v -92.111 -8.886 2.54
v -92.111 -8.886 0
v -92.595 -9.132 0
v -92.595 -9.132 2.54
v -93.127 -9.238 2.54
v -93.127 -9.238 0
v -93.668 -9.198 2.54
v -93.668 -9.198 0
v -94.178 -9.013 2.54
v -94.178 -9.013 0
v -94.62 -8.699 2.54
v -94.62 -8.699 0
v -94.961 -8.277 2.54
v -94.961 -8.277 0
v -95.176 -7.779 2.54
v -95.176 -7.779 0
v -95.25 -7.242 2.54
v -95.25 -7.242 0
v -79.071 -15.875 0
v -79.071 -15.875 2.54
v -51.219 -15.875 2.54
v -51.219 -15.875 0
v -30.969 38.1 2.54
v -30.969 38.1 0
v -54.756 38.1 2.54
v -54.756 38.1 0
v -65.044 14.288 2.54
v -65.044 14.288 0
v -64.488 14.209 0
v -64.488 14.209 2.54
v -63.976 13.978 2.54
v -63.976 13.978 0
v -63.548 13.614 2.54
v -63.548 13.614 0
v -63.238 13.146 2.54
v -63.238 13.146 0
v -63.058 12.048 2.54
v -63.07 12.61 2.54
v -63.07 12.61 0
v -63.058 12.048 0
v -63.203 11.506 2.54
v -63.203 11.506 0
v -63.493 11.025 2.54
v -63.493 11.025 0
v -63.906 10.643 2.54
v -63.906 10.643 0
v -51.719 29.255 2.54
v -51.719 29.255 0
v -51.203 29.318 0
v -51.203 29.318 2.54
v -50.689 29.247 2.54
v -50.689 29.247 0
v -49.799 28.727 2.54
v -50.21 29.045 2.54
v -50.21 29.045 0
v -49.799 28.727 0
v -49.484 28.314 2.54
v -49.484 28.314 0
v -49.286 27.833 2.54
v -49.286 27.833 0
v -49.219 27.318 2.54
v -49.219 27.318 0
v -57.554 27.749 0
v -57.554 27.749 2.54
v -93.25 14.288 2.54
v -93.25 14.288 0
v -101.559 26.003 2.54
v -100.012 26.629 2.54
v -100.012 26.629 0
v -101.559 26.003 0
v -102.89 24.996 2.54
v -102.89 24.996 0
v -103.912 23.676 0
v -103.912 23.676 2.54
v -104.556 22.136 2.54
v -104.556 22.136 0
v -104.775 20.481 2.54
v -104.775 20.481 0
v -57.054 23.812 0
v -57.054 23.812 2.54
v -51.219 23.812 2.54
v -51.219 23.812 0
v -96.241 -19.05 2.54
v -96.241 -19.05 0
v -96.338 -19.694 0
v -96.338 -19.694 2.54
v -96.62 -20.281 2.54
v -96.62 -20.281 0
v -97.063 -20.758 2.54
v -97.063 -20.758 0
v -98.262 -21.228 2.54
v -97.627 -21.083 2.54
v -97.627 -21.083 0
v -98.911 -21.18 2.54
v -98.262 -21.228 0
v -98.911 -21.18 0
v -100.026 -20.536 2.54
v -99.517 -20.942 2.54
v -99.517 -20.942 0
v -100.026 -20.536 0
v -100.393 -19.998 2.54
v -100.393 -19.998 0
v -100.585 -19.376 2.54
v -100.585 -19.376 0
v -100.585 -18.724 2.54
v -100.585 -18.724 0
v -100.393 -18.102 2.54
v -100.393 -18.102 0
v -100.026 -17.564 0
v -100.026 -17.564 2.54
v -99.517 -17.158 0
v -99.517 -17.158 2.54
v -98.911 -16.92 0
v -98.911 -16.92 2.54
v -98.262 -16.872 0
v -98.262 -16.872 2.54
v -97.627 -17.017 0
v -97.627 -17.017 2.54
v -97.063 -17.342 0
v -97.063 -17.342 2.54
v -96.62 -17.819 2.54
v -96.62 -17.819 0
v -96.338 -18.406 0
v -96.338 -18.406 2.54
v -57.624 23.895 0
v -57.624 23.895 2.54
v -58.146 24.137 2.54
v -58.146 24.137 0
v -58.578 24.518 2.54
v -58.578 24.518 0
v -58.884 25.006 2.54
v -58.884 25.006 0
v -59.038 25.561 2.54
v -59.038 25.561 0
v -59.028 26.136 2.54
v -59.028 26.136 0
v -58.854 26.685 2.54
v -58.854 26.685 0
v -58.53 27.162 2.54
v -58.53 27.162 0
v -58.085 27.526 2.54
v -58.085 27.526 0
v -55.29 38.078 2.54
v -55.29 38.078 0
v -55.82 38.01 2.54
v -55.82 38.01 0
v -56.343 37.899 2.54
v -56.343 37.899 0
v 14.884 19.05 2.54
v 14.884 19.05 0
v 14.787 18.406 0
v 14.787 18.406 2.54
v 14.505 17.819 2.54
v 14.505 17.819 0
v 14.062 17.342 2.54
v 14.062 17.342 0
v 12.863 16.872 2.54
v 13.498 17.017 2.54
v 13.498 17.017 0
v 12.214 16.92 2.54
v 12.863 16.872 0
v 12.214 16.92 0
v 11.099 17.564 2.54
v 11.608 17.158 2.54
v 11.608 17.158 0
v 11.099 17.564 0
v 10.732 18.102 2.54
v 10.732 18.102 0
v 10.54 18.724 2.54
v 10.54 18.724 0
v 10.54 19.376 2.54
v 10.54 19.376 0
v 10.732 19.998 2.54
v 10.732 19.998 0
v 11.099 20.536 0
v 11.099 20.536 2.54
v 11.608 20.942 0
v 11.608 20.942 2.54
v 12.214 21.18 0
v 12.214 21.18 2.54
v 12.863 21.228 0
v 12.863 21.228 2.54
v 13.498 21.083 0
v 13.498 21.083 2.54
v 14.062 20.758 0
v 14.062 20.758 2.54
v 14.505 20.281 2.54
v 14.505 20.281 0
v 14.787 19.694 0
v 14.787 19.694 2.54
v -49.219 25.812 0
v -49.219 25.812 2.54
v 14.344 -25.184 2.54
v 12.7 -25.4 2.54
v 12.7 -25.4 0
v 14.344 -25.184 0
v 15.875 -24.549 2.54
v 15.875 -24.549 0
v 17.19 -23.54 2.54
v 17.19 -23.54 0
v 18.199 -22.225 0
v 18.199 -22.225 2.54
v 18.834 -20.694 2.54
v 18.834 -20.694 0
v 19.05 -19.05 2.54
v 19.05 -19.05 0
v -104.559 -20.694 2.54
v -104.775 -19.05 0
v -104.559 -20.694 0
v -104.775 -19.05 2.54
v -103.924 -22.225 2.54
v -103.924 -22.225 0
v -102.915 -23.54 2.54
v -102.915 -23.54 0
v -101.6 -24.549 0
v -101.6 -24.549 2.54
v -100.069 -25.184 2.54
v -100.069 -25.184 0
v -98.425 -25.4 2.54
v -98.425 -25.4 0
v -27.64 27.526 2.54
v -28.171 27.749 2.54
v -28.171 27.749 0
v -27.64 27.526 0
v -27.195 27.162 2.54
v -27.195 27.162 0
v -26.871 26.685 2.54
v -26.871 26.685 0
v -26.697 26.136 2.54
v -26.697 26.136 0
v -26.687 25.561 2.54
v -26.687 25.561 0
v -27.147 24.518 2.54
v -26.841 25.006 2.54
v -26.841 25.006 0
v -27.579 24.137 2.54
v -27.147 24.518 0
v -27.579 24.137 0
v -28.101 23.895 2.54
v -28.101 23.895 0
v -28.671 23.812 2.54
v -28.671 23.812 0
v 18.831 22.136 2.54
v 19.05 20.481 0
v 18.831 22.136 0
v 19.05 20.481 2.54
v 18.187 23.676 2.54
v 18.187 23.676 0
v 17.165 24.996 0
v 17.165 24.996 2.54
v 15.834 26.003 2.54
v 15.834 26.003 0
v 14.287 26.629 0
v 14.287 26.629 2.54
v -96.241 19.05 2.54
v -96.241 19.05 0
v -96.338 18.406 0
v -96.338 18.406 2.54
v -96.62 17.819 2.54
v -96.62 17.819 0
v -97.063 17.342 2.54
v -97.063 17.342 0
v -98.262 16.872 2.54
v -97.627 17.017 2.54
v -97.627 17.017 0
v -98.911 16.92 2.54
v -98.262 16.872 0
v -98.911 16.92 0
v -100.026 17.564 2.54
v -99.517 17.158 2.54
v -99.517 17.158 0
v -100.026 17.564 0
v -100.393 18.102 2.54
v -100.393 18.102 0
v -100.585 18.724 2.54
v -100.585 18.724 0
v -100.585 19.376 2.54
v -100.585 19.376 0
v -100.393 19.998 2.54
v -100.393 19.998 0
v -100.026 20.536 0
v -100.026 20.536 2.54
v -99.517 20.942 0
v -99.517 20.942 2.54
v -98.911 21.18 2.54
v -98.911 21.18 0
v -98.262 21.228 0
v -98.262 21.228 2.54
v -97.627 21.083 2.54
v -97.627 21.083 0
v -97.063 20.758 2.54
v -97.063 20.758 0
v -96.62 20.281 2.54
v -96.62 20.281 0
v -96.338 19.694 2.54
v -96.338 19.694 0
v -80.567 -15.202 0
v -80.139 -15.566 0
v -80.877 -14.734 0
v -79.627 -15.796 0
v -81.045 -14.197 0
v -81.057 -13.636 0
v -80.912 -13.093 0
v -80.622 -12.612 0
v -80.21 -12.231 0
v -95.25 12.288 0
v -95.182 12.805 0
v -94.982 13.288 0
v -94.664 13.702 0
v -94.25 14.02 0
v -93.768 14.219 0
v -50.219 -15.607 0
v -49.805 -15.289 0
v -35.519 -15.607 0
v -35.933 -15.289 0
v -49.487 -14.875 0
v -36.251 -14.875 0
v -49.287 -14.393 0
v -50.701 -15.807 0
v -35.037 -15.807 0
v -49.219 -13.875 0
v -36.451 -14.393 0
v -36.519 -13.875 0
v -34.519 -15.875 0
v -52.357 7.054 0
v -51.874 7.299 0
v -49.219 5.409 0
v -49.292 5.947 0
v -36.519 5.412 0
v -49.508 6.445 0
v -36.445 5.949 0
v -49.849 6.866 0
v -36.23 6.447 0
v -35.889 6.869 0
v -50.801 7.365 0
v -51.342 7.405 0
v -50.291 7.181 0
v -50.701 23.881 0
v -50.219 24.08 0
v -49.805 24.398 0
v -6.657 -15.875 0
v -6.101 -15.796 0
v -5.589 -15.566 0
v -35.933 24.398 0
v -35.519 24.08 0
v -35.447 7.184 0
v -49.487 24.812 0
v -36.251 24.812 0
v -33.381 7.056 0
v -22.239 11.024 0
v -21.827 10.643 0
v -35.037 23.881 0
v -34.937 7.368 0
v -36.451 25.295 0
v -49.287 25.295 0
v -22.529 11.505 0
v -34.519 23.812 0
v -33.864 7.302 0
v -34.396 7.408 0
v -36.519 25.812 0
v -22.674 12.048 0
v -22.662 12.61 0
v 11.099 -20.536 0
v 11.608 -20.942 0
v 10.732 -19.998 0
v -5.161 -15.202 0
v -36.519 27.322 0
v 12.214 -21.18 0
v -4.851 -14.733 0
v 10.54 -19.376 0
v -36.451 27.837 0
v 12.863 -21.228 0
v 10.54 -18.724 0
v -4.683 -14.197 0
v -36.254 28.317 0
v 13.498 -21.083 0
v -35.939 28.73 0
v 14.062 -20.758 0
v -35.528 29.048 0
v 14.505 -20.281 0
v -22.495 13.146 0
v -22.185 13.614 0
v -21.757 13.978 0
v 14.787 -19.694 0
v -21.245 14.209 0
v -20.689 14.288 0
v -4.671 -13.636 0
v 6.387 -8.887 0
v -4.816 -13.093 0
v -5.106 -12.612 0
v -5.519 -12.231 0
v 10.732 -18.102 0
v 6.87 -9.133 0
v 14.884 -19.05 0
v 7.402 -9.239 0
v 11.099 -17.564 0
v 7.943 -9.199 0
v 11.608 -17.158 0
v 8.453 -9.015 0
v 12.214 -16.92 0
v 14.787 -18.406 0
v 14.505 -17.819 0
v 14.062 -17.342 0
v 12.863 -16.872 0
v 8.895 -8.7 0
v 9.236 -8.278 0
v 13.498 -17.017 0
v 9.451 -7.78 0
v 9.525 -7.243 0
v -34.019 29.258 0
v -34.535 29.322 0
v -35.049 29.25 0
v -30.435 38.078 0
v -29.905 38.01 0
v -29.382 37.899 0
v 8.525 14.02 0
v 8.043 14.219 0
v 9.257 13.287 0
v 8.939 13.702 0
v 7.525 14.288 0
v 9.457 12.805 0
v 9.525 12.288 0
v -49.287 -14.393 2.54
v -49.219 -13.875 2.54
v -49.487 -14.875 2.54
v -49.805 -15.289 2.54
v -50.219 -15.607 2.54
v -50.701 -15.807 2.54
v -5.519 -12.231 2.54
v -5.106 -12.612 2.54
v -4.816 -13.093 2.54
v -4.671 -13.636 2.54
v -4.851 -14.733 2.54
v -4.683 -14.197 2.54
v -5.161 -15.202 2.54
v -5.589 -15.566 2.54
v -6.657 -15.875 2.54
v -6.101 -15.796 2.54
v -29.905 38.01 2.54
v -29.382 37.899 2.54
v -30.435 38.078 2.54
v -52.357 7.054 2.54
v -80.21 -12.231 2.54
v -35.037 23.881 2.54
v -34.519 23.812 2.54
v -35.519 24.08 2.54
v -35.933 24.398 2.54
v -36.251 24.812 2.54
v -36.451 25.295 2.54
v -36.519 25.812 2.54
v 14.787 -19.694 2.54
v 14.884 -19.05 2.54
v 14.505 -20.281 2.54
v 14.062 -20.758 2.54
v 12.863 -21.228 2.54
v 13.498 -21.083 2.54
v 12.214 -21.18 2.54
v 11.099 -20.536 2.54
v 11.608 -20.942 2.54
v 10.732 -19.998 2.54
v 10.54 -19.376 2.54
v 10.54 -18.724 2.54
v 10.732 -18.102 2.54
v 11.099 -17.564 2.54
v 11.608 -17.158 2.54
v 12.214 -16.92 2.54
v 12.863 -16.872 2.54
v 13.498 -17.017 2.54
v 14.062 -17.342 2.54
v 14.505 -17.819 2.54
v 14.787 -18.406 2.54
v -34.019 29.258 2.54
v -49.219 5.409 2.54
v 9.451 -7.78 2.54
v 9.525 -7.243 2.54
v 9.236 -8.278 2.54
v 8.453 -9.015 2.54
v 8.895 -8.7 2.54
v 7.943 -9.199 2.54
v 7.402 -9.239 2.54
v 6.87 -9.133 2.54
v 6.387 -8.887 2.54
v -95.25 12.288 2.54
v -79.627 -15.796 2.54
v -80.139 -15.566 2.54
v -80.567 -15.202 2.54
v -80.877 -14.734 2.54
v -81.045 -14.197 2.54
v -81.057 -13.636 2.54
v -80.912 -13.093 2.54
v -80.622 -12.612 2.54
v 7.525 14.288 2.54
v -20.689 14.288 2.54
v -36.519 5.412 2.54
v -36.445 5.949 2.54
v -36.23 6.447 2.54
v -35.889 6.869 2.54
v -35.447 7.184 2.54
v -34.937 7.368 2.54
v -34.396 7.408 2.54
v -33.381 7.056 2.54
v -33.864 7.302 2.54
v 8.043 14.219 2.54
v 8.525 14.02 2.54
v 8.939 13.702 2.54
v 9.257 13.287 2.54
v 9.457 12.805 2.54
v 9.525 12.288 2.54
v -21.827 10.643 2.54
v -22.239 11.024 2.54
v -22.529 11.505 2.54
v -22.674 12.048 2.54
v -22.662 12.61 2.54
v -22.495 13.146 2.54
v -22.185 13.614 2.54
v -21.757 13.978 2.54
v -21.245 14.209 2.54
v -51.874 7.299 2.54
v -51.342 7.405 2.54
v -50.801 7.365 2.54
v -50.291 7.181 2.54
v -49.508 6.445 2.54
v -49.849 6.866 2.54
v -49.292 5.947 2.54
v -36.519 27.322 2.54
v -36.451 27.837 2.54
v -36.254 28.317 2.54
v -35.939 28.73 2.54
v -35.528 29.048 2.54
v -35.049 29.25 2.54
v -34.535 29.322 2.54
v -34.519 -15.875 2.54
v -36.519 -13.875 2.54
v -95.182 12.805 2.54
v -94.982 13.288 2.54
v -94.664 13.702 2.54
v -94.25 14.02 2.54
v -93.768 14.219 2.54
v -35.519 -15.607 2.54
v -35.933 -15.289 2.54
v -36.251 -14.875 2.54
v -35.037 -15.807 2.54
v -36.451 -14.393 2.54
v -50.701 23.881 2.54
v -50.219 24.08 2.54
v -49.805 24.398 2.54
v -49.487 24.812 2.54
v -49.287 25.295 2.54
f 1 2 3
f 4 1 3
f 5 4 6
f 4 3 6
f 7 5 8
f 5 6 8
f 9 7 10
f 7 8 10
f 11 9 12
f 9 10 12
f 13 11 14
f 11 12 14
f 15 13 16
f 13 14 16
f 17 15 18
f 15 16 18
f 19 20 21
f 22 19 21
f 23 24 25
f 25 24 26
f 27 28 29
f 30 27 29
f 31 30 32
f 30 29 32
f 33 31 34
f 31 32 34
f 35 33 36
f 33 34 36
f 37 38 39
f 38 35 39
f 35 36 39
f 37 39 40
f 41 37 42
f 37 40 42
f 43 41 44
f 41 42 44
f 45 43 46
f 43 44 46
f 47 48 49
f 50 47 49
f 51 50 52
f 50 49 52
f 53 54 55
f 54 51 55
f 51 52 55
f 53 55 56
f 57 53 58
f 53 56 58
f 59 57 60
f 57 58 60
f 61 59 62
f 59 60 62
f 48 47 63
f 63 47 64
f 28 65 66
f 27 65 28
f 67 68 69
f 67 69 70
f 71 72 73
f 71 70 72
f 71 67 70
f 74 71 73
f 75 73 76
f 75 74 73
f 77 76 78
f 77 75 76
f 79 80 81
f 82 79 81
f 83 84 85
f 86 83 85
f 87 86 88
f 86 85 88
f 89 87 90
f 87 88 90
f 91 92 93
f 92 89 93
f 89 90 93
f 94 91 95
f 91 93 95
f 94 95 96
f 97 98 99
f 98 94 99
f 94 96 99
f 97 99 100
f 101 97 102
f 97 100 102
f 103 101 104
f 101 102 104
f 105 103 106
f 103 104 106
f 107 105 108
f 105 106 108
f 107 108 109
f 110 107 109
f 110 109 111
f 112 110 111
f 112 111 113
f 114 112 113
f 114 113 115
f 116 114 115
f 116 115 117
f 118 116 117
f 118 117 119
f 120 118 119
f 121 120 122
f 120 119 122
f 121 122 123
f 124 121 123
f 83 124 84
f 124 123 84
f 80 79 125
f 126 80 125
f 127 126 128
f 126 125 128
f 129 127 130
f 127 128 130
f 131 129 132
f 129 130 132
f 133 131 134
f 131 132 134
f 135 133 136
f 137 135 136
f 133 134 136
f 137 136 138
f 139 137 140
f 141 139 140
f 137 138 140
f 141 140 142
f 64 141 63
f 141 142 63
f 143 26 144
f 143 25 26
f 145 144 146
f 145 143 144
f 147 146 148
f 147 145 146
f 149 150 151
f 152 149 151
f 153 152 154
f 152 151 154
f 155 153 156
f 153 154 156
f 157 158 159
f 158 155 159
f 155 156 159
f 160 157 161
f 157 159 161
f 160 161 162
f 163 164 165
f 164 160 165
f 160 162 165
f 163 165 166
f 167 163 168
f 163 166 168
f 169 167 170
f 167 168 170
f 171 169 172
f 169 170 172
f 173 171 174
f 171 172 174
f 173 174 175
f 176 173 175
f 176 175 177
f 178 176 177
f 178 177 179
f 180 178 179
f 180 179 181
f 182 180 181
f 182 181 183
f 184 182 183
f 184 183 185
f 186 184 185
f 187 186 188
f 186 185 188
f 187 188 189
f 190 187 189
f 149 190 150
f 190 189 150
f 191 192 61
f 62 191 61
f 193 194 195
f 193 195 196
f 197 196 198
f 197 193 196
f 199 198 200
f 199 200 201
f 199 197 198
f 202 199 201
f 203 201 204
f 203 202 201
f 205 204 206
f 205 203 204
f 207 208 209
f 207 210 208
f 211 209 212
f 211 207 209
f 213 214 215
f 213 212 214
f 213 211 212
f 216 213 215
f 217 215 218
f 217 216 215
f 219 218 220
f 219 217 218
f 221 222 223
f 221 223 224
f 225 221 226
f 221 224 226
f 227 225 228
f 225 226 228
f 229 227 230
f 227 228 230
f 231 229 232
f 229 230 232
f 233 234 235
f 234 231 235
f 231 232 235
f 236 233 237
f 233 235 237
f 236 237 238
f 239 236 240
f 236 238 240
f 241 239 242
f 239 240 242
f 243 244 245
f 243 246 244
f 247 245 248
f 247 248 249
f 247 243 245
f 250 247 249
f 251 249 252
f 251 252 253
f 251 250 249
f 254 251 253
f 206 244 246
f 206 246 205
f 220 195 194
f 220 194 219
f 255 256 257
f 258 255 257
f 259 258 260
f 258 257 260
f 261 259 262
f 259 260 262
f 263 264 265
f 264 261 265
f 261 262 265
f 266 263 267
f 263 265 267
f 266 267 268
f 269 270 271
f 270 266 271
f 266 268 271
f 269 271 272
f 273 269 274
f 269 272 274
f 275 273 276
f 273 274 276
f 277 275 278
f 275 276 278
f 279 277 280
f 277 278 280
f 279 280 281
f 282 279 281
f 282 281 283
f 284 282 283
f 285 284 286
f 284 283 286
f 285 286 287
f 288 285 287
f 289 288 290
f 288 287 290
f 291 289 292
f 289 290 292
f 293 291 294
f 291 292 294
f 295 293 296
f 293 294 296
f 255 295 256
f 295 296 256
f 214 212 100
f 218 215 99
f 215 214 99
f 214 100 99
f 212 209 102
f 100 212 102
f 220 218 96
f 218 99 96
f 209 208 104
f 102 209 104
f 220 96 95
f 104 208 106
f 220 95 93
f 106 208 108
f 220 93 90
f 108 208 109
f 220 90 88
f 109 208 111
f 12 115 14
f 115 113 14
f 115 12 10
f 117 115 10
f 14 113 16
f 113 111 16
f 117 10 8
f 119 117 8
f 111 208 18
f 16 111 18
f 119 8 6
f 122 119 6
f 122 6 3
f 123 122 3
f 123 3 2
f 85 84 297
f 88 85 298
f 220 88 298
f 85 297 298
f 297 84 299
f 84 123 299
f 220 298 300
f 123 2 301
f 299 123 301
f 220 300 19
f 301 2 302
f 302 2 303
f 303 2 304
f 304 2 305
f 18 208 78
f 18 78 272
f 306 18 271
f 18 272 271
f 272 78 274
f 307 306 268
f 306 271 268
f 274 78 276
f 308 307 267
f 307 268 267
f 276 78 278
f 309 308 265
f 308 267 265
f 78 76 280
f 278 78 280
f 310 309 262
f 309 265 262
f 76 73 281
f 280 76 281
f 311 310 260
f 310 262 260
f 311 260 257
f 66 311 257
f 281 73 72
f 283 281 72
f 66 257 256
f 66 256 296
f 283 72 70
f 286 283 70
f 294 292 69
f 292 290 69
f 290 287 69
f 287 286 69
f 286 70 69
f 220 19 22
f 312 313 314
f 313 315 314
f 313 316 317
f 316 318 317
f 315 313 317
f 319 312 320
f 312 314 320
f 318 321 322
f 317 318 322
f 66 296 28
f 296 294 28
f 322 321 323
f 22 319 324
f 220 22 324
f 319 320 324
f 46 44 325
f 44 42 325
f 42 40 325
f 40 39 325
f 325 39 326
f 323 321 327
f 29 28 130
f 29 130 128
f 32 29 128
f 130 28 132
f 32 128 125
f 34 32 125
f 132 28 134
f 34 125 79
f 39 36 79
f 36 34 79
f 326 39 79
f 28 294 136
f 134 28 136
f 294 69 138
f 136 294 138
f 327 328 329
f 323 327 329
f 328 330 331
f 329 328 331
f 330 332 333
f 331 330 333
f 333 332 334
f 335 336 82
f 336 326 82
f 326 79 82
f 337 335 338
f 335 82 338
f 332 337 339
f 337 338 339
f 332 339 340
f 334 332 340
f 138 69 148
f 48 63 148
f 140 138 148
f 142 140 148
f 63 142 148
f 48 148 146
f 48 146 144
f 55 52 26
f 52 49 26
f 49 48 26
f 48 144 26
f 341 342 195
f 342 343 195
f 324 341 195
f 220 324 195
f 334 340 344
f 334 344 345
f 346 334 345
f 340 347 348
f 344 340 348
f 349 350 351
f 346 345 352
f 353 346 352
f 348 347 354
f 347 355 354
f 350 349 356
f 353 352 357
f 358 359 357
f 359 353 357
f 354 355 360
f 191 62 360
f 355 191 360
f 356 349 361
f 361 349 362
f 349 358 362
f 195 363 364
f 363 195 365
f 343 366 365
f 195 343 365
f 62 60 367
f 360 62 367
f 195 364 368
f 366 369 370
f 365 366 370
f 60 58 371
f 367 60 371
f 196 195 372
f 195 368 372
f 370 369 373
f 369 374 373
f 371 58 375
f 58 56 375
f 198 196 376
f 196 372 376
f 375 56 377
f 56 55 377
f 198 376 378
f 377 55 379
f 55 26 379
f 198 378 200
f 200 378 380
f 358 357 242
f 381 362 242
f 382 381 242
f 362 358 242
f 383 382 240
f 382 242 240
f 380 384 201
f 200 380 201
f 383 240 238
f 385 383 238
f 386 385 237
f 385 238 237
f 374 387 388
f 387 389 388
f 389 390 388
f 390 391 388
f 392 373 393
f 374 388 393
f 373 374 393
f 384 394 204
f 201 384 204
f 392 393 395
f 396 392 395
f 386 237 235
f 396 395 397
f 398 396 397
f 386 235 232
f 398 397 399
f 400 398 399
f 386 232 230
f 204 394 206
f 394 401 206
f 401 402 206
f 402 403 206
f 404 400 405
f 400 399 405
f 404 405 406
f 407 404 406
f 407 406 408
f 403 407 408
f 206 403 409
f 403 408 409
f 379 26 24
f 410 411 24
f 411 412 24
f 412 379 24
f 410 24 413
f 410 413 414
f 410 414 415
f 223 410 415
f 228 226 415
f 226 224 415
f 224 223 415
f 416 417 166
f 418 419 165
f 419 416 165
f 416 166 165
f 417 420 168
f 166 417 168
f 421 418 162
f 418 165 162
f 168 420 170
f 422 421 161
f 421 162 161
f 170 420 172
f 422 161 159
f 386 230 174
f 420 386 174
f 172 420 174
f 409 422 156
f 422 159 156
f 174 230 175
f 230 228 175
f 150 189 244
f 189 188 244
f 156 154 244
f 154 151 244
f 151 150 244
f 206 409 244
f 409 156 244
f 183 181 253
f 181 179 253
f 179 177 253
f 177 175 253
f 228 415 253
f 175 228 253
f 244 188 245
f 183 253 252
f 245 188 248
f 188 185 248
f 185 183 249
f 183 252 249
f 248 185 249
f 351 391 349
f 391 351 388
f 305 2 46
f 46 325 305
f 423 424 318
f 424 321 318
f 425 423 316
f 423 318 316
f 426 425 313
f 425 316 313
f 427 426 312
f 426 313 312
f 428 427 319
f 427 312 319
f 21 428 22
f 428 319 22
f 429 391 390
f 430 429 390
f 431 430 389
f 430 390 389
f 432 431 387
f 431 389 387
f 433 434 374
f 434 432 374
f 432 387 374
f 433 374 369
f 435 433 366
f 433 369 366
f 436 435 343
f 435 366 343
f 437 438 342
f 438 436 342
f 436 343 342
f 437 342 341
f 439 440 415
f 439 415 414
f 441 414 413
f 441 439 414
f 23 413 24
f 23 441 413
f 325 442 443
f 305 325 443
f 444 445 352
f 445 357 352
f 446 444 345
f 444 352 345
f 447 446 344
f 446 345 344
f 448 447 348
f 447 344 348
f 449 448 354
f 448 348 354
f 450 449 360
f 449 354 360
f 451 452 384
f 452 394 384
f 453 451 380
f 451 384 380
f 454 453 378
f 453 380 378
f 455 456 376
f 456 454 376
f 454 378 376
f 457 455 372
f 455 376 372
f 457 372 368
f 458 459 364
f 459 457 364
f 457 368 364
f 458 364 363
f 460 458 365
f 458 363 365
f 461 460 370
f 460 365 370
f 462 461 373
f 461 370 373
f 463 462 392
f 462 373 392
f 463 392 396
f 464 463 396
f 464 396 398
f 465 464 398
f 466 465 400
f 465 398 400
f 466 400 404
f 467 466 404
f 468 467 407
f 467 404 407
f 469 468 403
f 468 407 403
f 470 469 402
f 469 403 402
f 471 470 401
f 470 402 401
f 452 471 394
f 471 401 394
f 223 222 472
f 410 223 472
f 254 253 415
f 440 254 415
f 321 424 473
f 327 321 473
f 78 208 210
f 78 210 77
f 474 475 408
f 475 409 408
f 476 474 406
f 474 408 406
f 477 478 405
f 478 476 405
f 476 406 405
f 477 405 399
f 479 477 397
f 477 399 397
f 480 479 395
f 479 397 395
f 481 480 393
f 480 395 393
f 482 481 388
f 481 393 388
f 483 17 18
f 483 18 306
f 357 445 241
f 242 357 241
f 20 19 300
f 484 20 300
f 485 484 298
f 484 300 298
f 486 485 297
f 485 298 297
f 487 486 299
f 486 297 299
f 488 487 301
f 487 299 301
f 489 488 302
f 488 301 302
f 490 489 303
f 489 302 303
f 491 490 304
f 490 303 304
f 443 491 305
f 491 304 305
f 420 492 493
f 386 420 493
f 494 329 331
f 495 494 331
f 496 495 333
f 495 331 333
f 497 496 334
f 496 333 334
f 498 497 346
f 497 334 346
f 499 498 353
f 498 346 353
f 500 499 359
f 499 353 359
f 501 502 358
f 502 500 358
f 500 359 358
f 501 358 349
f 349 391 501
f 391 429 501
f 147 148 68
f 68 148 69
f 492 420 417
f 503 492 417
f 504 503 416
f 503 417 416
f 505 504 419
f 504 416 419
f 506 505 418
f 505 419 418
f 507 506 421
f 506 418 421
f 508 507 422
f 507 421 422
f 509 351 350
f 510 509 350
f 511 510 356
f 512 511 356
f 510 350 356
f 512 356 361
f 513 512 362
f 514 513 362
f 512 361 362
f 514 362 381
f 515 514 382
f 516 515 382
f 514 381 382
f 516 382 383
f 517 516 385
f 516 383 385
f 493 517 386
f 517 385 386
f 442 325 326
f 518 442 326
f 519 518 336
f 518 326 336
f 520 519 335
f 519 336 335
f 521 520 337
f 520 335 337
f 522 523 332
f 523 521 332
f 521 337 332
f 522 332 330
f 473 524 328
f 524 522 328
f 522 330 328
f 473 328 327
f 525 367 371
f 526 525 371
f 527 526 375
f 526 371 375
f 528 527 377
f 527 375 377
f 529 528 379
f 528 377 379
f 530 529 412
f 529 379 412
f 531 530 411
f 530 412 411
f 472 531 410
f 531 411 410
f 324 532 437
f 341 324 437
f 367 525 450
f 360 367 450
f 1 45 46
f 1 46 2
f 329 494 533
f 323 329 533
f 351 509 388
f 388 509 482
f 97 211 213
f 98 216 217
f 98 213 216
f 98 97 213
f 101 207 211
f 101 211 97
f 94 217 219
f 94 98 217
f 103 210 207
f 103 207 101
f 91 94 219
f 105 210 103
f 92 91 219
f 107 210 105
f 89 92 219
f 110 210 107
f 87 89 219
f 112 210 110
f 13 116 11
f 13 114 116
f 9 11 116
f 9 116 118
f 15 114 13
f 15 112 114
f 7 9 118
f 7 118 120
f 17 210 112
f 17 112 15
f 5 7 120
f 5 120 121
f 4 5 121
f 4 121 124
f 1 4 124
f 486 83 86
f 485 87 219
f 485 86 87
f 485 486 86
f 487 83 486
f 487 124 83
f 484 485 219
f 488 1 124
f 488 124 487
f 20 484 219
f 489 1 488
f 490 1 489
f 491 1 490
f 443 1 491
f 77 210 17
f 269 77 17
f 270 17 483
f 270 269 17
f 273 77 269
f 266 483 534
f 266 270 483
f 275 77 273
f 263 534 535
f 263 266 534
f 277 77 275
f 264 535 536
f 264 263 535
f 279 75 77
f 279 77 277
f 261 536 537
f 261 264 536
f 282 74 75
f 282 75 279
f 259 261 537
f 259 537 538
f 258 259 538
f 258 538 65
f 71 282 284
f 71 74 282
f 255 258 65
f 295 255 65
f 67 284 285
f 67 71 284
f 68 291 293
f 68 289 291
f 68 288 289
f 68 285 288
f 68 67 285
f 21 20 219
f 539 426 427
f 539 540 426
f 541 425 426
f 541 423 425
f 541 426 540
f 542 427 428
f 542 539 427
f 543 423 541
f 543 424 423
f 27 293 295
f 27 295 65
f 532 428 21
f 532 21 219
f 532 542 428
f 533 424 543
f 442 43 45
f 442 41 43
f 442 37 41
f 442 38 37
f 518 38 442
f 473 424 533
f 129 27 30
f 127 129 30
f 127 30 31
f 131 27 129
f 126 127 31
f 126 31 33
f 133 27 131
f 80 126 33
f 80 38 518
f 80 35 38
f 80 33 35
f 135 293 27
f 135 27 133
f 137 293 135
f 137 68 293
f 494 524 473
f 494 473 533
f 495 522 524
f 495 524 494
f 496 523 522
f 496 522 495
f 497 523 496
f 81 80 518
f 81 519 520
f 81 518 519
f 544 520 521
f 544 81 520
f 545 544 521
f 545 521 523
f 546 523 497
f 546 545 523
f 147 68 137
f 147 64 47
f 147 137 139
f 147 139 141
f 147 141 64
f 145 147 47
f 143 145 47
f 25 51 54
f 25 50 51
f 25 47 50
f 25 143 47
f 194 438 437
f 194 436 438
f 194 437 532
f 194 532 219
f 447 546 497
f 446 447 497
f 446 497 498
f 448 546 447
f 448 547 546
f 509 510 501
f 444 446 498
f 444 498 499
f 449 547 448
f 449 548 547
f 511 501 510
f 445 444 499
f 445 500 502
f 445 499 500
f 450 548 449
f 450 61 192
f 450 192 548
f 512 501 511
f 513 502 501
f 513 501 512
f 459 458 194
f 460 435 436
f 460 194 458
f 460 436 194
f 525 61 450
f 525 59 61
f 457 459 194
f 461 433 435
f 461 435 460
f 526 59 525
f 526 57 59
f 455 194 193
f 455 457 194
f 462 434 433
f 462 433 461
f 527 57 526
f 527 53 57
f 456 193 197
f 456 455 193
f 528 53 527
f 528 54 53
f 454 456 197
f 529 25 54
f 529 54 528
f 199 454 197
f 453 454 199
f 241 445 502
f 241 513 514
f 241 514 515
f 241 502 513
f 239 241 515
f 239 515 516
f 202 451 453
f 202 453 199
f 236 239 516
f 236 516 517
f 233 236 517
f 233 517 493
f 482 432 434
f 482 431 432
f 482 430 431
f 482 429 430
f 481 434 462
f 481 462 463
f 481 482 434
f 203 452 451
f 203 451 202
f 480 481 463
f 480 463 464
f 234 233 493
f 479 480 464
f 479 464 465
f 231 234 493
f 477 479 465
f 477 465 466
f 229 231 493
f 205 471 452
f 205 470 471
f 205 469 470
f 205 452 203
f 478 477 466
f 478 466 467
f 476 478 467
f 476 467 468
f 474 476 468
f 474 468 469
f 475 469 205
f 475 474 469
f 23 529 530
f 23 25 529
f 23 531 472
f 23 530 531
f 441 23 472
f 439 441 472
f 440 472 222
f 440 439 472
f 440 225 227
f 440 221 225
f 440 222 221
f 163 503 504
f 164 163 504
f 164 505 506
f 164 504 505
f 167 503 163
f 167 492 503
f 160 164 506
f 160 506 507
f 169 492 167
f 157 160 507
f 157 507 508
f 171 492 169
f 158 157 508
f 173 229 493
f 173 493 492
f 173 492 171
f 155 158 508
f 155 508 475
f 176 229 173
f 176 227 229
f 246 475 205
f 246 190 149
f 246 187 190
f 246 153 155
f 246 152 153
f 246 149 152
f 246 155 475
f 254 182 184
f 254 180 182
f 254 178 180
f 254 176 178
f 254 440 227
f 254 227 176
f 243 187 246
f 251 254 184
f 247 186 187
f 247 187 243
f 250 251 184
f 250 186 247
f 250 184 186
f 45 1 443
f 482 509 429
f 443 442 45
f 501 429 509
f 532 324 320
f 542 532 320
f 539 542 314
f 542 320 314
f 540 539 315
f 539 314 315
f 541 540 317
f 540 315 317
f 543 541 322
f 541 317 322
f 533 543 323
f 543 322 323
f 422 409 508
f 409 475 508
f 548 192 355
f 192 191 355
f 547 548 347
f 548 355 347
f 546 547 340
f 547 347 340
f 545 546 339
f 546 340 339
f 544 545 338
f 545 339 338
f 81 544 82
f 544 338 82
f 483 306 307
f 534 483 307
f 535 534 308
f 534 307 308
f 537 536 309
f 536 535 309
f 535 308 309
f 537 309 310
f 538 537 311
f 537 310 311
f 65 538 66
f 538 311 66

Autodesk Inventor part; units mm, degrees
ref_plane "YZ Plane" through (0, 0, 0) normal (1, 0, 0) x (0, 1, 0)
ref_plane "XZ Plane" through (0, 0, 0) normal (0, 1, 0) x (-1, 0, 0)
ref_plane "XY Plane" through (0, 0, 0) normal (0, 0, 1) x (1, 0, 0)
sketch "Sketch1" plane through (0, 0, 0) normal (0, 0, 1) x (1, 0, 0)
  circle A0 centre (12.7, -19.05) radius 2.1844 projected
  circle A1 centre (12.7, 19.05) radius 2.1844 projected
  circle A2 centre (-98.425, -19.05) radius 2.1844 projected
  circle A3 centre (-98.425, 19.05) radius 2.1844 projected
  line L0 (19.05, -25.4) -> (-104.775, -25.4)
  line L1 (-104.775, -25.4) -> (-104.775, 25.4)
  line L2 (-104.775, 25.4) -> (19.05, 25.4)
  line L3 (19.05, 25.4) -> (19.05, -25.4)
  line L4 (19.05, -25.4) -> (-104.775, 25.4) construction
  line L5 (-104.775, -25.4) -> (19.05, 25.4) construction
  line L6 (19.05, 25.4) -> (-30.1625, 38.1)
  line L7 (-30.1625, 38.1) -> (-55.5625, 38.1)
  line L8 (-55.5625, 38.1) -> (-104.775, 25.4)
  line L9 (-42.8625, 0) -> (-42.8625, 38.1) construction
  point P0 (0, 0)
  dimension "d0" = 6.35
  dimension "d1" = 6.35
  dimension "d2" = 50.8
  dimension "d3" = 6.35
  dimension "d4" = 12.7
  dimension "d6" = 25.4
extrude "Extrusion1" add sketch "Sketch1" along normal blind 2.54
fillet "Fillet1" radius 6.35 6 edges at (19.05, -25.4, 1.27) (19.05, 25.4, 1.27) (-30.1625, 38.1, 1.27) (-55.5625, 38.1, 1.27) (-104.775, 25.4, 1.27) (-104.775, -25.4, 1.27)
sketch "Sketch2" plane through (0, 0, 2.54) normal (0, 0, 1) x (1, 0, 0)
  line L0 (9.525, -11.0599) -> (9.525, 14.2875)
  line L1 (9.525, 14.2875) -> (-27.0917, 14.2875)
  line L2 (-27.0917, 14.2875) -> (9.525, -11.0599)
  line L3 (-12.917, 23.8125) -> (-36.5189, 29.9033)
  line L4 (-36.5189, 29.9033) -> (-36.5189, 23.8125)
  line L5 (-36.5189, 23.8125) -> (-12.917, 23.8125)
  line L6 (-49.2189, 23.8125) -> (-49.2189, 29.9)
  line L7 (-49.2189, 29.9) -> (-72.808, 23.8125)
  line L8 (-72.808, 23.8125) -> (-49.2189, 23.8125)
  line L9 (-0.254, -15.875) -> (-36.5189, 9.2289)
  line L10 (-36.5189, 9.2289) -> (-36.5189, -15.875)
  line L11 (-36.5189, -15.875) -> (-0.254, -15.875)
  line L12 (-49.2189, -15.875) -> (-49.2189, 9.2266)
  line L13 (-49.2189, 9.2266) -> (-85.4731, -15.875)
  line L14 (-85.4731, -15.875) -> (-49.2189, -15.875)
  line L15 (-95.25, -11.0591) -> (-95.25, 14.2875)
  line L16 (-95.25, 14.2875) -> (-58.6421, 14.2875)
  line L17 (-58.6421, 14.2875) -> (-95.25, -11.0591)
  line L18 (-98.425, -25.4) -> (12.7, -25.4) projected
  line L19 (19.05, -19.05) -> (19.05, 20.4807) projected
  arc A0 (-29.3819, 37.8986) -> (-30.9686, 38.1) centre (-30.9686, 31.75) ccw projected
  line L20 (14.2867, 26.6292) -> (-29.3819, 37.8986) projected
  line L21 (-56.3431, 37.8986) -> (-100.0117, 26.6292) projected
  circle A1 centre (12.7, 19.05) radius 2.1844 projected
  line L22 (-104.775, 20.4807) -> (-104.775, -19.05) projected
  circle A2 centre (12.7, -19.05) radius 2.1844 projected
  circle A3 centre (-98.425, -19.05) radius 2.1844 projected
  line L23 (-36.5189, 23.8125) -> (-98.425, -19.05) construction
  line L24 (12.7, -19.05) -> (-49.2189, 23.8125) construction
  point P0 (0, 0)
  point P1 (-30.1689, 38.0494)
  point P2 (-8.7834, 14.2875)
  dimension "d10" = 9.525
  dimension "d11" = 9.525
  dimension "d12" = 12.7
  dimension "d13" = 6.35
  dimension "d14" = 9.525
  dimension "d15" = 9.525
  dimension "d16" = 9.525
  dimension "d17" = 9.525
  dimension "d18" = 4.7625
  dimension "d19" = 9.525
  dimension "d20" = 9.525
  dimension "d21" = 9.525
  dimension "d22" = 4.7625
  dimension "d23" = 4.7625
extrude "Extrusion2" cut sketch "Sketch2" against normal through all contours L2 L1 L0 | L5 L4 L3 | L8 L7 L6 | L11 L10 L9 | L14 L13 L12 | L15 L16 L17
fillet "Fillet2" radius 2 18 edges at (-49.2189, 9.2266, 1.27) (-36.5189, 9.2289, 1.27) (-27.0917, 14.2875, 1.27) (-49.2189, 23.8125, 1.27) (-36.5189, 23.8125, 1.27) (-58.6421, 14.2875, 1.27) (-49.2189, 29.9, 1.27) (-36.5189, 29.9033, 1.27) (-72.808, 23.8125, 1.27) (-12.917, 23.8125, 1.27) (9.525, -11.0599, 1.27) (-0.254, -15.875, 1.27) (9.525, 14.2875, 1.27) (-36.5189, -15.875, 1.27) (-49.2189, -15.875, 1.27) (-95.25, 14.2875, 1.27) (-95.25, -11.0591, 1.27) (-85.4731, -15.875, 1.27)
equation "\"d1\" = d0"
equation "\"d3\" = d0"
properties part number "rangoon"
